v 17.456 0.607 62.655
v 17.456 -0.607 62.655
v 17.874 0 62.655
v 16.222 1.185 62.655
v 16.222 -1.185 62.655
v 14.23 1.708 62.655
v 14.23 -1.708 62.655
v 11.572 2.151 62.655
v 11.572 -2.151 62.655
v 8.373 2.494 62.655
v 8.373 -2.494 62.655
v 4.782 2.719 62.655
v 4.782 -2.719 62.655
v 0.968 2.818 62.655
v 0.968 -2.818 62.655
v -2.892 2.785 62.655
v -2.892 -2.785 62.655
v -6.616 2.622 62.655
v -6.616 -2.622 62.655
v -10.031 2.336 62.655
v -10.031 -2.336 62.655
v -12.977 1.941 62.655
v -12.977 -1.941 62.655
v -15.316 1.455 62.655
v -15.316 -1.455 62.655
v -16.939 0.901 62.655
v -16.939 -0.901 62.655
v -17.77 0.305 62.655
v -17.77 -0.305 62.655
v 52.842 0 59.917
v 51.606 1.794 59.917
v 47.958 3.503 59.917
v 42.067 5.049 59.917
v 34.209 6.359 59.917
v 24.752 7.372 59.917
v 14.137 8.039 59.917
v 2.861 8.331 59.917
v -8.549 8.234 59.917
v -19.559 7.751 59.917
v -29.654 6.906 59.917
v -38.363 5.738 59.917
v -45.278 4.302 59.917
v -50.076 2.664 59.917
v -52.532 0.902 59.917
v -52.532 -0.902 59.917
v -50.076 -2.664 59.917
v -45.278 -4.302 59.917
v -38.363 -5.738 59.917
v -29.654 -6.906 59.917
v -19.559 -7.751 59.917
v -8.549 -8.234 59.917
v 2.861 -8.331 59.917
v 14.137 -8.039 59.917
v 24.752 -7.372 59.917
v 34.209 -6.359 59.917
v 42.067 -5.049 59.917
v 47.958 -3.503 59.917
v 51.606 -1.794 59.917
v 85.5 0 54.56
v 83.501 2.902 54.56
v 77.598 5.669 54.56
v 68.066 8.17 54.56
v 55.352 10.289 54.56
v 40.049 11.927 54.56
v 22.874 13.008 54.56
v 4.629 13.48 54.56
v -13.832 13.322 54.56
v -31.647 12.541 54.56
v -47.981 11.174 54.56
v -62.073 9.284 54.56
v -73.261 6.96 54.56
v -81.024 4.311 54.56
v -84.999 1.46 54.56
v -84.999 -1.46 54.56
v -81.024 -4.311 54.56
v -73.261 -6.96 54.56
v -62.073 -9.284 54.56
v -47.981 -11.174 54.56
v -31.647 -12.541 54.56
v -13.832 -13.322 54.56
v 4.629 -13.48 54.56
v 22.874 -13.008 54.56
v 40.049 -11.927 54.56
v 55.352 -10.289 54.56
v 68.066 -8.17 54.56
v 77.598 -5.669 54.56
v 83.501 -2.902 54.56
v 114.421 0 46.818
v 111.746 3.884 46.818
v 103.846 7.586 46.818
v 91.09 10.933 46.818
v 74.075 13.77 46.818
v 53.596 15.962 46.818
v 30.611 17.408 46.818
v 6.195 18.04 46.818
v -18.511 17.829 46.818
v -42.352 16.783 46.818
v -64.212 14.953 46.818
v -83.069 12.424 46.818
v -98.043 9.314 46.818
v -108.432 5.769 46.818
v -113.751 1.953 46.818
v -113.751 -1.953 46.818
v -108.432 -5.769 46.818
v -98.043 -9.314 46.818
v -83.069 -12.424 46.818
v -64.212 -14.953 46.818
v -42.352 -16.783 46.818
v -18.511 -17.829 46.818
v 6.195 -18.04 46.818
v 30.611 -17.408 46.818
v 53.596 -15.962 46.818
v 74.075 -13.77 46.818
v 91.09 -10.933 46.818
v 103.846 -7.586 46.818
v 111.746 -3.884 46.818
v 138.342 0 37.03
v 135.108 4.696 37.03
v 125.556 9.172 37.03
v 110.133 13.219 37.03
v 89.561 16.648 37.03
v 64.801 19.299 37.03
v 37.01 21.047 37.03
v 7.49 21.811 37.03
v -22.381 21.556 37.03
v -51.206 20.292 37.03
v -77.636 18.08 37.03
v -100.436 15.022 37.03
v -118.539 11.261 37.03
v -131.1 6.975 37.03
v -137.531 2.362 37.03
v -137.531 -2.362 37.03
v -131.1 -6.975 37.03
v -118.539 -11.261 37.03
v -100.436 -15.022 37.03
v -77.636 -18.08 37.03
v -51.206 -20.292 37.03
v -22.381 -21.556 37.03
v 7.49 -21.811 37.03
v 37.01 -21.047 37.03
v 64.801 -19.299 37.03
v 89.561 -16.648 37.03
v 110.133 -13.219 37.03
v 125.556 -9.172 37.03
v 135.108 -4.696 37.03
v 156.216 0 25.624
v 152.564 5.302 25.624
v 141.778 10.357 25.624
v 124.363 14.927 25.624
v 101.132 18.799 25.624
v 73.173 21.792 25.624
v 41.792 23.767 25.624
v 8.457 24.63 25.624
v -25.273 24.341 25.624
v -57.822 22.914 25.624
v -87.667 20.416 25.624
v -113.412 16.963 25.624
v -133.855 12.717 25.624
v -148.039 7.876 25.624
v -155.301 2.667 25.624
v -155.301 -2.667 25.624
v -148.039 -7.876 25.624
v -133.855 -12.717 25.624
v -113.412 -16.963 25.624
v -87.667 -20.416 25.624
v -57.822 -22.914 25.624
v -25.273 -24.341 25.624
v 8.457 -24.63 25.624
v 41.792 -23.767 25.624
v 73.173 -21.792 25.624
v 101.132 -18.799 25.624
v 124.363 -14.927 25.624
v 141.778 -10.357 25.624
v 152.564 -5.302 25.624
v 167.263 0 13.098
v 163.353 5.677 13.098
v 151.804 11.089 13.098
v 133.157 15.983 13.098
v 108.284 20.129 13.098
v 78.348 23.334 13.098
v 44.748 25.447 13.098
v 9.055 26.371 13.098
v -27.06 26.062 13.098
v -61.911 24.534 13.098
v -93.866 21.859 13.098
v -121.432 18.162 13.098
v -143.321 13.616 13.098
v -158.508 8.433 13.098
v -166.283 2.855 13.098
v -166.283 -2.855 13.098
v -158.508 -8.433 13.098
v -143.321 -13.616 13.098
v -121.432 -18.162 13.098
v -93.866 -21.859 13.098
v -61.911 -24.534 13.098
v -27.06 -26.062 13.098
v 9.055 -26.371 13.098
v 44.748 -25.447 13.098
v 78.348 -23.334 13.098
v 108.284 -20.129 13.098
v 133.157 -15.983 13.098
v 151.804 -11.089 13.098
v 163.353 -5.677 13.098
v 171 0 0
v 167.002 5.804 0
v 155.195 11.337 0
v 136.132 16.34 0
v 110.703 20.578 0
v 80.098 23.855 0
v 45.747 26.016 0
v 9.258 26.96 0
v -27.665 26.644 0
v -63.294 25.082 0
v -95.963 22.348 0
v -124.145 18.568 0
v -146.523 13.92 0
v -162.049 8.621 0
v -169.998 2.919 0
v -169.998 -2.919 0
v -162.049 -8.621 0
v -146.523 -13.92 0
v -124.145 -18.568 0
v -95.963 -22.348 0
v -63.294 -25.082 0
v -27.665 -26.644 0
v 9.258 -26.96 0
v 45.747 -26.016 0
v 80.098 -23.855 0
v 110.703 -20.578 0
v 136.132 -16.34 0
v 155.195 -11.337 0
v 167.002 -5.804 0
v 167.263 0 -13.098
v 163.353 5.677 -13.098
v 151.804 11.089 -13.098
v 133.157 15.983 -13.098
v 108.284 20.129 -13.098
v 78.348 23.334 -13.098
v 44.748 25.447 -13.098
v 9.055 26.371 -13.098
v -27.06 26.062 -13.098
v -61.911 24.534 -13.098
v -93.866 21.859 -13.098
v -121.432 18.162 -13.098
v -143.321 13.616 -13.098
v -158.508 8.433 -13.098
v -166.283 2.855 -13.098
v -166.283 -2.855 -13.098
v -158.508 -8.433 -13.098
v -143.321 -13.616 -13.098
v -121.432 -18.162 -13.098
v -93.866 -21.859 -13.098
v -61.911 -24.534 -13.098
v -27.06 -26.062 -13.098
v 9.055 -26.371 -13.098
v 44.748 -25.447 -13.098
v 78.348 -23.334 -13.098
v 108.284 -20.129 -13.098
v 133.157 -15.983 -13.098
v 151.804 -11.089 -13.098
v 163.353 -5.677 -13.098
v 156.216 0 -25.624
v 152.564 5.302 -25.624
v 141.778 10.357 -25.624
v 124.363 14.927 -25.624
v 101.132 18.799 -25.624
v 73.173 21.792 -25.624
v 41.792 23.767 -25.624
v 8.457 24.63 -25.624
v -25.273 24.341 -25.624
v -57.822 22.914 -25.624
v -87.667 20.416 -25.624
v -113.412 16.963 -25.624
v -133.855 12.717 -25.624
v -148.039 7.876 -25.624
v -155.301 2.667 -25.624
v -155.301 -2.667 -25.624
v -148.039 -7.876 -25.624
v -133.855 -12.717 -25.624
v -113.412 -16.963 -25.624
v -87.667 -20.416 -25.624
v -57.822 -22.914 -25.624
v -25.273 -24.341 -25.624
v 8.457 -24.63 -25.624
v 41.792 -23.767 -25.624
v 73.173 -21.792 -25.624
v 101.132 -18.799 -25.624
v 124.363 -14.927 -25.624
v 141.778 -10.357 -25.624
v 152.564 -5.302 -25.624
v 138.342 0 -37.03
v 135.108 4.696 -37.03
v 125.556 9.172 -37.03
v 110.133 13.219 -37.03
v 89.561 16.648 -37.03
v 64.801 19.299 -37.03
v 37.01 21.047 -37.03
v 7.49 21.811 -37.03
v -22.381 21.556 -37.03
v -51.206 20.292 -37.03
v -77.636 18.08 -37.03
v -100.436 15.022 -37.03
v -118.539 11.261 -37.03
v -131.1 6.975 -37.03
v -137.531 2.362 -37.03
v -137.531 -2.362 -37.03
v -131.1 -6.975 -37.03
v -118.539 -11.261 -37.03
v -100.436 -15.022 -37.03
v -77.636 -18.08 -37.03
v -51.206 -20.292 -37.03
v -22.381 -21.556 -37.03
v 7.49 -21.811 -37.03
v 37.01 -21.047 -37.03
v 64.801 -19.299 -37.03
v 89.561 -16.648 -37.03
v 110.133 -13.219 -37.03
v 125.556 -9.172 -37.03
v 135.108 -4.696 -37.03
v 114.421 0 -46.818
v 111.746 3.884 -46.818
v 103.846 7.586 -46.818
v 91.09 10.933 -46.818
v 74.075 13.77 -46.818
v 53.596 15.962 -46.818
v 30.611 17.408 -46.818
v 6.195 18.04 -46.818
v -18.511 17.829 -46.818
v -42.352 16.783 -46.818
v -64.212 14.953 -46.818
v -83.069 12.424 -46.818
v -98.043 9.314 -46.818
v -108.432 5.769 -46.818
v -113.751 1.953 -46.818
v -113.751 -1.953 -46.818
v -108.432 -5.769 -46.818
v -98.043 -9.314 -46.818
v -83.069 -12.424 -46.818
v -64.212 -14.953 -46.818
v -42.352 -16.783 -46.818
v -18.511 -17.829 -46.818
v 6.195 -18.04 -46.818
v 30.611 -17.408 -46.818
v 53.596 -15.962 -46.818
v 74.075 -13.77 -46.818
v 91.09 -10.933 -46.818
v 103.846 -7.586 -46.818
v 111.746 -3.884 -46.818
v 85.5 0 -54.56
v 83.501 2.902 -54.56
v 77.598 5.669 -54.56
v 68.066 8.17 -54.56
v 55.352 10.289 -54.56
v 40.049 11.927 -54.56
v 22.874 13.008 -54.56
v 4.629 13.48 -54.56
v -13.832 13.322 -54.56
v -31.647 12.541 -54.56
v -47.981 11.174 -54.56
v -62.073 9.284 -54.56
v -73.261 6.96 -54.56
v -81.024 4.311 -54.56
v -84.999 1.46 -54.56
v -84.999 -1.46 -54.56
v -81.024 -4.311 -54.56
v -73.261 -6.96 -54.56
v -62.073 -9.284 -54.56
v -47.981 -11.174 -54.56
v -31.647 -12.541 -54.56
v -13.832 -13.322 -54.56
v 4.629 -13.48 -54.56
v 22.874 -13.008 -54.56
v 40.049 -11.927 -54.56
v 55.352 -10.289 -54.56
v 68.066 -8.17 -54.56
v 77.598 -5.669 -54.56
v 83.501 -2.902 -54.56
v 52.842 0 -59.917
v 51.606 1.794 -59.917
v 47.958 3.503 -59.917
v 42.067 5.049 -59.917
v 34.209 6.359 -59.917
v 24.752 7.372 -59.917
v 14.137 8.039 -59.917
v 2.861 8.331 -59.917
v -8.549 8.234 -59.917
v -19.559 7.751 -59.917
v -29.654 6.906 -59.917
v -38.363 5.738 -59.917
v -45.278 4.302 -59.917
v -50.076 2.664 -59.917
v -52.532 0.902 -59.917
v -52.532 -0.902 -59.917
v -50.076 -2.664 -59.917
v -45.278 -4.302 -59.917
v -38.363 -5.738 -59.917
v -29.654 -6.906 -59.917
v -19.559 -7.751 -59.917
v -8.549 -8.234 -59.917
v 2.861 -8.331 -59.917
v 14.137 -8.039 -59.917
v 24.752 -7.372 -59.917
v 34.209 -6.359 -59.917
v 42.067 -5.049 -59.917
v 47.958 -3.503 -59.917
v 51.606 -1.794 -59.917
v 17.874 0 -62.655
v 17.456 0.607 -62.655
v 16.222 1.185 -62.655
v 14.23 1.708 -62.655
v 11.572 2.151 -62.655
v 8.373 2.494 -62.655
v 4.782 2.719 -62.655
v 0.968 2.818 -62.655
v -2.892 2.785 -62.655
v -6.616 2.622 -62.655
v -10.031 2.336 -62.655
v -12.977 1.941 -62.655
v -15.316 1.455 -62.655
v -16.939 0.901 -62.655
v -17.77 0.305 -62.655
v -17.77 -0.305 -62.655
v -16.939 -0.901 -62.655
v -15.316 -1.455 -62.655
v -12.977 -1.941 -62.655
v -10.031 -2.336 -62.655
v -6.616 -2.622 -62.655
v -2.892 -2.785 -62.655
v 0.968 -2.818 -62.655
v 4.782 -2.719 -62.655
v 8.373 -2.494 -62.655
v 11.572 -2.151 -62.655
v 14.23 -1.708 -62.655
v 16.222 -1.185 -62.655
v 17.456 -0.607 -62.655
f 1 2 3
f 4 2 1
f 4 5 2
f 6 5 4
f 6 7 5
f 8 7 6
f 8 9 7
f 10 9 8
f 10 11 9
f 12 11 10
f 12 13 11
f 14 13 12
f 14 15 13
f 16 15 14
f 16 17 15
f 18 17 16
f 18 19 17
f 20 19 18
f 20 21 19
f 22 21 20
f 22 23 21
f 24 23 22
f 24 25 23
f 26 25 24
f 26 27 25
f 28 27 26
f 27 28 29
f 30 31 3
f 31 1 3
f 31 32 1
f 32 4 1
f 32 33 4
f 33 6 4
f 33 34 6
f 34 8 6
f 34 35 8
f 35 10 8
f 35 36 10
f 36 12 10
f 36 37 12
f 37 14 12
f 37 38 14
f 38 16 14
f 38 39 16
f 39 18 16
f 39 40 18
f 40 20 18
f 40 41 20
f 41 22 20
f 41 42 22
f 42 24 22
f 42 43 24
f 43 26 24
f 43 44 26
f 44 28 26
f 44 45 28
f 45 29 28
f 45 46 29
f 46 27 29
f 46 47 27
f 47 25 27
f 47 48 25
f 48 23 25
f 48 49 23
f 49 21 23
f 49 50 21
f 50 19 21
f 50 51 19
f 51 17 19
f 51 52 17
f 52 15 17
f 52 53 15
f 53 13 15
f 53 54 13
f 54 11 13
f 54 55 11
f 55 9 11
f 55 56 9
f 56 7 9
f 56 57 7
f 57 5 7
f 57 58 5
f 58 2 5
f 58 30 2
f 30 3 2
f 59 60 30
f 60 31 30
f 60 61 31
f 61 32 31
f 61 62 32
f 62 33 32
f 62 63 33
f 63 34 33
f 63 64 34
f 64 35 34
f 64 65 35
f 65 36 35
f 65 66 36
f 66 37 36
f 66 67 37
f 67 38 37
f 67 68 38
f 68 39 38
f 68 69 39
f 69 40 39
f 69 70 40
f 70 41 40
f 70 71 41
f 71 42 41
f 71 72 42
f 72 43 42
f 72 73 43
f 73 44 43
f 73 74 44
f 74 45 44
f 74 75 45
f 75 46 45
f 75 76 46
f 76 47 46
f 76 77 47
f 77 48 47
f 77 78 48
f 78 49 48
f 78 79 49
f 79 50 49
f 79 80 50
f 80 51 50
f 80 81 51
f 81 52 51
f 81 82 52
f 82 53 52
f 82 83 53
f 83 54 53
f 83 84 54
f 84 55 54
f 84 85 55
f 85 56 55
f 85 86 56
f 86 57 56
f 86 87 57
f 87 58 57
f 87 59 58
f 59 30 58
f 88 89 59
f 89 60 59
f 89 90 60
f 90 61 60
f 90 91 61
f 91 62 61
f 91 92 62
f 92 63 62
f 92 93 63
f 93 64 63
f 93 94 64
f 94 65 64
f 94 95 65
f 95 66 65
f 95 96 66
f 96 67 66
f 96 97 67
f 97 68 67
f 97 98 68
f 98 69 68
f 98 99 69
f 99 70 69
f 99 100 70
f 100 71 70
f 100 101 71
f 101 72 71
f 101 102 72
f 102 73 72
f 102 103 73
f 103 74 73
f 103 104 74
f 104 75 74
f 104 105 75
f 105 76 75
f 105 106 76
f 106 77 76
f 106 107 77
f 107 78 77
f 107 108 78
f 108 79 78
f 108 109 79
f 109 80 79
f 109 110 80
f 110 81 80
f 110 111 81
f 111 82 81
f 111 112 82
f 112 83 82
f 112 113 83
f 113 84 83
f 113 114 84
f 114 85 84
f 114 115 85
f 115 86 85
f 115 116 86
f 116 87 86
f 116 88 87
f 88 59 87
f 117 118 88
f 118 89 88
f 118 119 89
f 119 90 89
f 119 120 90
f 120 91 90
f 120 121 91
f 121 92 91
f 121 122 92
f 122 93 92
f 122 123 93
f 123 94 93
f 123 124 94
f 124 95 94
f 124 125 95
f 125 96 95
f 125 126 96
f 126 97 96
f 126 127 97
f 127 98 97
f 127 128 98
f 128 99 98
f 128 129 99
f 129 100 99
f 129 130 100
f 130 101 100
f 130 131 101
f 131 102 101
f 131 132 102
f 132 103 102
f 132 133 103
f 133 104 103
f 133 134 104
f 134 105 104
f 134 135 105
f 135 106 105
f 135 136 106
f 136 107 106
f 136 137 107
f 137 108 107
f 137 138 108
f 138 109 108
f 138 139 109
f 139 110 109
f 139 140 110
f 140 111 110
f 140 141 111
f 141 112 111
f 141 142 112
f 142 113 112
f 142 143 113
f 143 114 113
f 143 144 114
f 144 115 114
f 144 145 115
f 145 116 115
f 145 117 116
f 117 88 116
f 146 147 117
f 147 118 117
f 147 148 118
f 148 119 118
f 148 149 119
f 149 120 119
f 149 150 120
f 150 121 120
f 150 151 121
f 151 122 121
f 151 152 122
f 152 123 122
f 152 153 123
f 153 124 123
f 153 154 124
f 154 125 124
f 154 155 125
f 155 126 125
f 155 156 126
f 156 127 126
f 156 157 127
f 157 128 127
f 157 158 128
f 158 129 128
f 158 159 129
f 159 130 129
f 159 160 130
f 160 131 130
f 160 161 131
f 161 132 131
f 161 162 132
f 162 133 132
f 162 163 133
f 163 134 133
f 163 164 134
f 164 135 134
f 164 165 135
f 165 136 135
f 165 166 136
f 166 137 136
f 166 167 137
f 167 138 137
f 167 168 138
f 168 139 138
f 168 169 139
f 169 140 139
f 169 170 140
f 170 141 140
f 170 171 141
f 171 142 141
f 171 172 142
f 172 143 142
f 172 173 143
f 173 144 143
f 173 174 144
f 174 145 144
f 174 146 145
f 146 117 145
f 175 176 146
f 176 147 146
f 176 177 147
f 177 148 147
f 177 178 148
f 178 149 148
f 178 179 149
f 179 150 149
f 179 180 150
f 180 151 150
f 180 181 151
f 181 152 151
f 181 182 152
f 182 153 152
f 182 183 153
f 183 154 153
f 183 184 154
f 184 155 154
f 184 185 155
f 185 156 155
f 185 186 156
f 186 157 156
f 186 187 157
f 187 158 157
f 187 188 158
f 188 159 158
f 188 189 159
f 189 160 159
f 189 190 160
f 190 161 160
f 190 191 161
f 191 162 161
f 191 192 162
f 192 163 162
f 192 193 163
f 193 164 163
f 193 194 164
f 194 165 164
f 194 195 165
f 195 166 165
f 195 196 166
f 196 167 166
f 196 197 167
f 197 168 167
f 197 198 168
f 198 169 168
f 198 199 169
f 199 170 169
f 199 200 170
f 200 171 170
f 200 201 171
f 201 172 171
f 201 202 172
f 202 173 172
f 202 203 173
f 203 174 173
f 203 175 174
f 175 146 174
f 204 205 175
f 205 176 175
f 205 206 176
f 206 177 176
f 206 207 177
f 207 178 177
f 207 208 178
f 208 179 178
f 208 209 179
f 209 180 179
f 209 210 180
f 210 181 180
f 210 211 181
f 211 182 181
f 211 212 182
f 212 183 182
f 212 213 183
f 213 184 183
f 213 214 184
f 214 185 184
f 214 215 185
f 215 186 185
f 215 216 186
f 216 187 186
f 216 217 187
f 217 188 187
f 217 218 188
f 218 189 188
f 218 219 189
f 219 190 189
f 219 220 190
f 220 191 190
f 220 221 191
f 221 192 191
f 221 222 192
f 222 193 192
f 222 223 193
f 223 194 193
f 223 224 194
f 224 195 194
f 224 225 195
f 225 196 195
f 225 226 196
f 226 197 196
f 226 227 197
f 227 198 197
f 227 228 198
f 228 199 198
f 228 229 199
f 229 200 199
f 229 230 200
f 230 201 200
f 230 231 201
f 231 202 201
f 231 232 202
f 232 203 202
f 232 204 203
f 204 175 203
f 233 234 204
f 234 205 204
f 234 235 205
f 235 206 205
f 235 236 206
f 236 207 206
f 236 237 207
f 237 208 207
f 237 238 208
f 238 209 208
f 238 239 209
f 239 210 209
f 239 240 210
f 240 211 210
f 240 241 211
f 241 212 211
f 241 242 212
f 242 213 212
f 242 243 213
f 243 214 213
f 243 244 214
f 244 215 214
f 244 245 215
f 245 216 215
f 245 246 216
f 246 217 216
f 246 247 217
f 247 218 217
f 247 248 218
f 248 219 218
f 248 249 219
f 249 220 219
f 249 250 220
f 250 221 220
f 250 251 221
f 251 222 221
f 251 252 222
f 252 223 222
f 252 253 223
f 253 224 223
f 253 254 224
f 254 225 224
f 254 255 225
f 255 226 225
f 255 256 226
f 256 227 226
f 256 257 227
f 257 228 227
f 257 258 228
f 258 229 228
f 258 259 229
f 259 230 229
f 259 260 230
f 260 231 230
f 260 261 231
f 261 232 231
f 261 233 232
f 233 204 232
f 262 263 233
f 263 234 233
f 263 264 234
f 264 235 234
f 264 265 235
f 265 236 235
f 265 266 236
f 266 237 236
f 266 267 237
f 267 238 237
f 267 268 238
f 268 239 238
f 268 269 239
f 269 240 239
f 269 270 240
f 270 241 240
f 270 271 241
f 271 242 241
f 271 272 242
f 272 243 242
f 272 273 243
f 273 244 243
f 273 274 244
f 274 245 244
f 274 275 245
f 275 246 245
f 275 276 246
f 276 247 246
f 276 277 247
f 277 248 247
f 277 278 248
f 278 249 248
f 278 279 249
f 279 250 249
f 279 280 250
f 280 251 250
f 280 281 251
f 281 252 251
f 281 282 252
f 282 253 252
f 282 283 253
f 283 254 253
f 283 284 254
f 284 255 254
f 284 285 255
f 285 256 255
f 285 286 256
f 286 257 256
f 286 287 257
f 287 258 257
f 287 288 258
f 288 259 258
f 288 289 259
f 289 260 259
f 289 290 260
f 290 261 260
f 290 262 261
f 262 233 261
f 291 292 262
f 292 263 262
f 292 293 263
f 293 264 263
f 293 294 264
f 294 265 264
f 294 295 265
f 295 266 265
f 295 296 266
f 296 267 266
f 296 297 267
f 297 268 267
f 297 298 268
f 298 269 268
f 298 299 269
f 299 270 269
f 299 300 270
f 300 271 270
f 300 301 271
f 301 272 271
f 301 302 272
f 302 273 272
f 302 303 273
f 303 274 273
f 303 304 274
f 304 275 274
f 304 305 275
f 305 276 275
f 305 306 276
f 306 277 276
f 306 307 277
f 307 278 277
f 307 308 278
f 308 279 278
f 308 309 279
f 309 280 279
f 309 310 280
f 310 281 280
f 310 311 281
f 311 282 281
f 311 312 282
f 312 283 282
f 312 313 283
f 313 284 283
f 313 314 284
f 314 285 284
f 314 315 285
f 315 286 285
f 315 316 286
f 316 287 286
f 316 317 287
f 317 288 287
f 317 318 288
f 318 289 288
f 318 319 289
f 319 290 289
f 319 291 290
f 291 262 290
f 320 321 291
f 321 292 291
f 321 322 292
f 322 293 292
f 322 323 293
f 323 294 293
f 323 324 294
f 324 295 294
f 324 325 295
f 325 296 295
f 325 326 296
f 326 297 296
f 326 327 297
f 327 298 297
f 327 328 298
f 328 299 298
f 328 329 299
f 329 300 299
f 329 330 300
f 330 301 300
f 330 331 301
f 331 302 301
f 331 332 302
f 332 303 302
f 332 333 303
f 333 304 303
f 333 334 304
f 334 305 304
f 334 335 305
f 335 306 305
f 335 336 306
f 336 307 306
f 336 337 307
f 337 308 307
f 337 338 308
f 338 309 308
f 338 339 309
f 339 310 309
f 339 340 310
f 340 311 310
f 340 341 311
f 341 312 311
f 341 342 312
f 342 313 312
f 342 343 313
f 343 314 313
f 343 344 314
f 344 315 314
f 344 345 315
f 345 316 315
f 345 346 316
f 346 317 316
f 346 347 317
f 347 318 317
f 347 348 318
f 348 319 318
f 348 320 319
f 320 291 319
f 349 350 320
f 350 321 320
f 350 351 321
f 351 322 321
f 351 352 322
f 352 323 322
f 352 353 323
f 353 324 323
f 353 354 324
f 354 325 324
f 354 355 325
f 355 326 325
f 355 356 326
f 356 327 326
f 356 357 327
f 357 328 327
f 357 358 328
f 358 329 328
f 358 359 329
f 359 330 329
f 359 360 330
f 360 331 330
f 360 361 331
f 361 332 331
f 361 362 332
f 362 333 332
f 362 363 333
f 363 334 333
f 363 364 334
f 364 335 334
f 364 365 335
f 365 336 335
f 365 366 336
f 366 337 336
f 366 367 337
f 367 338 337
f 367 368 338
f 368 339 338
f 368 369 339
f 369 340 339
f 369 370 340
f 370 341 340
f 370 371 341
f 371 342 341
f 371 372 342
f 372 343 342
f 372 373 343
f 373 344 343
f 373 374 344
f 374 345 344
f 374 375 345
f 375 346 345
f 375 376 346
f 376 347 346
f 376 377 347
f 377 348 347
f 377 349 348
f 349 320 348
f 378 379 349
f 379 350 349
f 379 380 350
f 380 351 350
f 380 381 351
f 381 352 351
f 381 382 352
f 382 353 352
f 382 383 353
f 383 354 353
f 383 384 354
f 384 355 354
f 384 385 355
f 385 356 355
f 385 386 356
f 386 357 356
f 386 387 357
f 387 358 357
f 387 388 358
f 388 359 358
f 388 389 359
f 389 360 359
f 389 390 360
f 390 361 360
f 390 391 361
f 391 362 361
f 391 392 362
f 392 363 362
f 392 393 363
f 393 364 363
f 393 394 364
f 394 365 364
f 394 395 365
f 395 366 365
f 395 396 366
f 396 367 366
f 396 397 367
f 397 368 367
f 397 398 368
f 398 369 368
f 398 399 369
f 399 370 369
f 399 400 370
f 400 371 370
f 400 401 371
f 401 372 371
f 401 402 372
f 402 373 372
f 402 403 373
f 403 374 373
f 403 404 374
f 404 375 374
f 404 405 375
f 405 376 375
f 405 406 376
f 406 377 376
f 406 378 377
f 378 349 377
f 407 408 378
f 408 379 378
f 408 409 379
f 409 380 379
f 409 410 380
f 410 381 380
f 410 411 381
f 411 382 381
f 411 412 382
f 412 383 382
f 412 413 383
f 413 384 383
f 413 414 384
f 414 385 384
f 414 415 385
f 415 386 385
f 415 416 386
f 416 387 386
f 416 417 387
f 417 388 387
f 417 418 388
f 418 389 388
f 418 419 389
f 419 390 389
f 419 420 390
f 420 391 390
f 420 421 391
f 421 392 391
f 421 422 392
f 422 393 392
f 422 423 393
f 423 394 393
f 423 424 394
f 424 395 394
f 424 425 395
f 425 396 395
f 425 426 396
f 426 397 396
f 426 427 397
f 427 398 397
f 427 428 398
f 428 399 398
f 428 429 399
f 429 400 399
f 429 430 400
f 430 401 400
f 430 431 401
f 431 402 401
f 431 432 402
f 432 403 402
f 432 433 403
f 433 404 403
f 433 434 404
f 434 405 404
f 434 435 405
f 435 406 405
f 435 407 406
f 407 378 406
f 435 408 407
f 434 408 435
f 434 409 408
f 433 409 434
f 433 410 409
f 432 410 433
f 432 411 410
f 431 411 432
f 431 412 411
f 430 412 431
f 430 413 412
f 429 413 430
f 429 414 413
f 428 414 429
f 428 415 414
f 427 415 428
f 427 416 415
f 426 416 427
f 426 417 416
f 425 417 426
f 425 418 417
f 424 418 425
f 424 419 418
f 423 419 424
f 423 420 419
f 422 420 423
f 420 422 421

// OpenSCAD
// Generated by SolidPython 1.0.1 on 2020-07-29 00:46:53


scale(v = [19, 3, 7]) {
	sphere(r = 9);
}
/***********************************************
*********      SolidPython code:      **********
************************************************
 
# import packages: SolidPython
from solid import *
from solid.utils import *
from itertools import chain, combinations, permutations


class Resize:

    def __init__(self, scad_file):
        self.scad_file = scad_file
        #self.scad_file = import_scad(scad_file)
        # cone/cylinder param:
        self.r1 = 0
        self.r2 = 0
        self.h = 0
        # rectangular prism param:
        self.w = 0
        self.l = 0
        # ellipse param:
        self.r = 0

    # import OpenScad code (file name corresponds to shape)


    # classify shape + parameters
    def assign(self, param1, param2, param3):
        if self.scad_file == 'cone.scad':
            self.r1 = param1
            self.r2 = param2
            self.h = param3
        elif self.scad_file == 'cylinder.scad':
            self.r1 = param1
            self.r2 = param2
            self.h = param3
        elif self.scad_file == 'rectangularPrism.scad':
            self.h = param1
            self.l = param2
            self.w = param3
        else:
            self.r = param1
            self.h = param2

    # resize parameters
    def iterate(self):
        x = range(3, 20, 2)
        i = 1
        if self.scad_file == 'cone.scad':
            tempList = list(permutations(x, 2))
            for temp in tempList:
                param1 = temp[0]
                param2 = temp[1]
                filepath = 'produced_scad_files/' + 'cone' + str(param1) + '_' + str(param2) + '_' + '.scad'
                scad_render_to_file(cylinder(h=param1, r1=param2, r2=0), filepath)

        elif self.scad_file == 'cylinder.scad':
            tempList = list(permutations(x, 3))
            for temp in tempList:
                param1 = temp[0]
                param2 = temp[1]
                filepath = 'produced_scad_files/' + 'cylinder' + str(param1) + '_' + str(param2) + '_' + '.scad'
                scad_render_to_file(cylinder(h=param1, r1=param2, r2=param2), filepath)

        elif self.scad_file == 'rectangularPrism.scad':
            tempList = list(permutations(x, 3))
            for temp in tempList:
                param1 = temp[0]
                param2 = temp[1]
                param3 = temp[2]
                filepath = 'produced_scad_files/' + 'rectangularPrism' + str(param1) + '_' + str(param2) + '_' + str(
                    param3) + '.scad'
                scad_render_to_file(cube(size=(param1, param2, param3)), filepath)

        elif self.scad_file == 'ellipse.scad':
            tempList = list(permutations(x, 4))
            for temp in tempList:
                param1 = temp[0]
                param2 = temp[1]
                param3 = temp[2]
                param4 = temp[3]
                filepath = 'produced_scad_files/' + 'ellipse' + str(param1) + '_' + str(param2) + '_' + str(param3) + '_' + str(param4) + '.scad'
                scad_render_to_file(scale([param1, param2, param3])(sphere(r=param4)), filepath)

    def render_to_scadfile(self):
        scad_render_to_file(scad, 'example.scad') 
 
************************************************/
